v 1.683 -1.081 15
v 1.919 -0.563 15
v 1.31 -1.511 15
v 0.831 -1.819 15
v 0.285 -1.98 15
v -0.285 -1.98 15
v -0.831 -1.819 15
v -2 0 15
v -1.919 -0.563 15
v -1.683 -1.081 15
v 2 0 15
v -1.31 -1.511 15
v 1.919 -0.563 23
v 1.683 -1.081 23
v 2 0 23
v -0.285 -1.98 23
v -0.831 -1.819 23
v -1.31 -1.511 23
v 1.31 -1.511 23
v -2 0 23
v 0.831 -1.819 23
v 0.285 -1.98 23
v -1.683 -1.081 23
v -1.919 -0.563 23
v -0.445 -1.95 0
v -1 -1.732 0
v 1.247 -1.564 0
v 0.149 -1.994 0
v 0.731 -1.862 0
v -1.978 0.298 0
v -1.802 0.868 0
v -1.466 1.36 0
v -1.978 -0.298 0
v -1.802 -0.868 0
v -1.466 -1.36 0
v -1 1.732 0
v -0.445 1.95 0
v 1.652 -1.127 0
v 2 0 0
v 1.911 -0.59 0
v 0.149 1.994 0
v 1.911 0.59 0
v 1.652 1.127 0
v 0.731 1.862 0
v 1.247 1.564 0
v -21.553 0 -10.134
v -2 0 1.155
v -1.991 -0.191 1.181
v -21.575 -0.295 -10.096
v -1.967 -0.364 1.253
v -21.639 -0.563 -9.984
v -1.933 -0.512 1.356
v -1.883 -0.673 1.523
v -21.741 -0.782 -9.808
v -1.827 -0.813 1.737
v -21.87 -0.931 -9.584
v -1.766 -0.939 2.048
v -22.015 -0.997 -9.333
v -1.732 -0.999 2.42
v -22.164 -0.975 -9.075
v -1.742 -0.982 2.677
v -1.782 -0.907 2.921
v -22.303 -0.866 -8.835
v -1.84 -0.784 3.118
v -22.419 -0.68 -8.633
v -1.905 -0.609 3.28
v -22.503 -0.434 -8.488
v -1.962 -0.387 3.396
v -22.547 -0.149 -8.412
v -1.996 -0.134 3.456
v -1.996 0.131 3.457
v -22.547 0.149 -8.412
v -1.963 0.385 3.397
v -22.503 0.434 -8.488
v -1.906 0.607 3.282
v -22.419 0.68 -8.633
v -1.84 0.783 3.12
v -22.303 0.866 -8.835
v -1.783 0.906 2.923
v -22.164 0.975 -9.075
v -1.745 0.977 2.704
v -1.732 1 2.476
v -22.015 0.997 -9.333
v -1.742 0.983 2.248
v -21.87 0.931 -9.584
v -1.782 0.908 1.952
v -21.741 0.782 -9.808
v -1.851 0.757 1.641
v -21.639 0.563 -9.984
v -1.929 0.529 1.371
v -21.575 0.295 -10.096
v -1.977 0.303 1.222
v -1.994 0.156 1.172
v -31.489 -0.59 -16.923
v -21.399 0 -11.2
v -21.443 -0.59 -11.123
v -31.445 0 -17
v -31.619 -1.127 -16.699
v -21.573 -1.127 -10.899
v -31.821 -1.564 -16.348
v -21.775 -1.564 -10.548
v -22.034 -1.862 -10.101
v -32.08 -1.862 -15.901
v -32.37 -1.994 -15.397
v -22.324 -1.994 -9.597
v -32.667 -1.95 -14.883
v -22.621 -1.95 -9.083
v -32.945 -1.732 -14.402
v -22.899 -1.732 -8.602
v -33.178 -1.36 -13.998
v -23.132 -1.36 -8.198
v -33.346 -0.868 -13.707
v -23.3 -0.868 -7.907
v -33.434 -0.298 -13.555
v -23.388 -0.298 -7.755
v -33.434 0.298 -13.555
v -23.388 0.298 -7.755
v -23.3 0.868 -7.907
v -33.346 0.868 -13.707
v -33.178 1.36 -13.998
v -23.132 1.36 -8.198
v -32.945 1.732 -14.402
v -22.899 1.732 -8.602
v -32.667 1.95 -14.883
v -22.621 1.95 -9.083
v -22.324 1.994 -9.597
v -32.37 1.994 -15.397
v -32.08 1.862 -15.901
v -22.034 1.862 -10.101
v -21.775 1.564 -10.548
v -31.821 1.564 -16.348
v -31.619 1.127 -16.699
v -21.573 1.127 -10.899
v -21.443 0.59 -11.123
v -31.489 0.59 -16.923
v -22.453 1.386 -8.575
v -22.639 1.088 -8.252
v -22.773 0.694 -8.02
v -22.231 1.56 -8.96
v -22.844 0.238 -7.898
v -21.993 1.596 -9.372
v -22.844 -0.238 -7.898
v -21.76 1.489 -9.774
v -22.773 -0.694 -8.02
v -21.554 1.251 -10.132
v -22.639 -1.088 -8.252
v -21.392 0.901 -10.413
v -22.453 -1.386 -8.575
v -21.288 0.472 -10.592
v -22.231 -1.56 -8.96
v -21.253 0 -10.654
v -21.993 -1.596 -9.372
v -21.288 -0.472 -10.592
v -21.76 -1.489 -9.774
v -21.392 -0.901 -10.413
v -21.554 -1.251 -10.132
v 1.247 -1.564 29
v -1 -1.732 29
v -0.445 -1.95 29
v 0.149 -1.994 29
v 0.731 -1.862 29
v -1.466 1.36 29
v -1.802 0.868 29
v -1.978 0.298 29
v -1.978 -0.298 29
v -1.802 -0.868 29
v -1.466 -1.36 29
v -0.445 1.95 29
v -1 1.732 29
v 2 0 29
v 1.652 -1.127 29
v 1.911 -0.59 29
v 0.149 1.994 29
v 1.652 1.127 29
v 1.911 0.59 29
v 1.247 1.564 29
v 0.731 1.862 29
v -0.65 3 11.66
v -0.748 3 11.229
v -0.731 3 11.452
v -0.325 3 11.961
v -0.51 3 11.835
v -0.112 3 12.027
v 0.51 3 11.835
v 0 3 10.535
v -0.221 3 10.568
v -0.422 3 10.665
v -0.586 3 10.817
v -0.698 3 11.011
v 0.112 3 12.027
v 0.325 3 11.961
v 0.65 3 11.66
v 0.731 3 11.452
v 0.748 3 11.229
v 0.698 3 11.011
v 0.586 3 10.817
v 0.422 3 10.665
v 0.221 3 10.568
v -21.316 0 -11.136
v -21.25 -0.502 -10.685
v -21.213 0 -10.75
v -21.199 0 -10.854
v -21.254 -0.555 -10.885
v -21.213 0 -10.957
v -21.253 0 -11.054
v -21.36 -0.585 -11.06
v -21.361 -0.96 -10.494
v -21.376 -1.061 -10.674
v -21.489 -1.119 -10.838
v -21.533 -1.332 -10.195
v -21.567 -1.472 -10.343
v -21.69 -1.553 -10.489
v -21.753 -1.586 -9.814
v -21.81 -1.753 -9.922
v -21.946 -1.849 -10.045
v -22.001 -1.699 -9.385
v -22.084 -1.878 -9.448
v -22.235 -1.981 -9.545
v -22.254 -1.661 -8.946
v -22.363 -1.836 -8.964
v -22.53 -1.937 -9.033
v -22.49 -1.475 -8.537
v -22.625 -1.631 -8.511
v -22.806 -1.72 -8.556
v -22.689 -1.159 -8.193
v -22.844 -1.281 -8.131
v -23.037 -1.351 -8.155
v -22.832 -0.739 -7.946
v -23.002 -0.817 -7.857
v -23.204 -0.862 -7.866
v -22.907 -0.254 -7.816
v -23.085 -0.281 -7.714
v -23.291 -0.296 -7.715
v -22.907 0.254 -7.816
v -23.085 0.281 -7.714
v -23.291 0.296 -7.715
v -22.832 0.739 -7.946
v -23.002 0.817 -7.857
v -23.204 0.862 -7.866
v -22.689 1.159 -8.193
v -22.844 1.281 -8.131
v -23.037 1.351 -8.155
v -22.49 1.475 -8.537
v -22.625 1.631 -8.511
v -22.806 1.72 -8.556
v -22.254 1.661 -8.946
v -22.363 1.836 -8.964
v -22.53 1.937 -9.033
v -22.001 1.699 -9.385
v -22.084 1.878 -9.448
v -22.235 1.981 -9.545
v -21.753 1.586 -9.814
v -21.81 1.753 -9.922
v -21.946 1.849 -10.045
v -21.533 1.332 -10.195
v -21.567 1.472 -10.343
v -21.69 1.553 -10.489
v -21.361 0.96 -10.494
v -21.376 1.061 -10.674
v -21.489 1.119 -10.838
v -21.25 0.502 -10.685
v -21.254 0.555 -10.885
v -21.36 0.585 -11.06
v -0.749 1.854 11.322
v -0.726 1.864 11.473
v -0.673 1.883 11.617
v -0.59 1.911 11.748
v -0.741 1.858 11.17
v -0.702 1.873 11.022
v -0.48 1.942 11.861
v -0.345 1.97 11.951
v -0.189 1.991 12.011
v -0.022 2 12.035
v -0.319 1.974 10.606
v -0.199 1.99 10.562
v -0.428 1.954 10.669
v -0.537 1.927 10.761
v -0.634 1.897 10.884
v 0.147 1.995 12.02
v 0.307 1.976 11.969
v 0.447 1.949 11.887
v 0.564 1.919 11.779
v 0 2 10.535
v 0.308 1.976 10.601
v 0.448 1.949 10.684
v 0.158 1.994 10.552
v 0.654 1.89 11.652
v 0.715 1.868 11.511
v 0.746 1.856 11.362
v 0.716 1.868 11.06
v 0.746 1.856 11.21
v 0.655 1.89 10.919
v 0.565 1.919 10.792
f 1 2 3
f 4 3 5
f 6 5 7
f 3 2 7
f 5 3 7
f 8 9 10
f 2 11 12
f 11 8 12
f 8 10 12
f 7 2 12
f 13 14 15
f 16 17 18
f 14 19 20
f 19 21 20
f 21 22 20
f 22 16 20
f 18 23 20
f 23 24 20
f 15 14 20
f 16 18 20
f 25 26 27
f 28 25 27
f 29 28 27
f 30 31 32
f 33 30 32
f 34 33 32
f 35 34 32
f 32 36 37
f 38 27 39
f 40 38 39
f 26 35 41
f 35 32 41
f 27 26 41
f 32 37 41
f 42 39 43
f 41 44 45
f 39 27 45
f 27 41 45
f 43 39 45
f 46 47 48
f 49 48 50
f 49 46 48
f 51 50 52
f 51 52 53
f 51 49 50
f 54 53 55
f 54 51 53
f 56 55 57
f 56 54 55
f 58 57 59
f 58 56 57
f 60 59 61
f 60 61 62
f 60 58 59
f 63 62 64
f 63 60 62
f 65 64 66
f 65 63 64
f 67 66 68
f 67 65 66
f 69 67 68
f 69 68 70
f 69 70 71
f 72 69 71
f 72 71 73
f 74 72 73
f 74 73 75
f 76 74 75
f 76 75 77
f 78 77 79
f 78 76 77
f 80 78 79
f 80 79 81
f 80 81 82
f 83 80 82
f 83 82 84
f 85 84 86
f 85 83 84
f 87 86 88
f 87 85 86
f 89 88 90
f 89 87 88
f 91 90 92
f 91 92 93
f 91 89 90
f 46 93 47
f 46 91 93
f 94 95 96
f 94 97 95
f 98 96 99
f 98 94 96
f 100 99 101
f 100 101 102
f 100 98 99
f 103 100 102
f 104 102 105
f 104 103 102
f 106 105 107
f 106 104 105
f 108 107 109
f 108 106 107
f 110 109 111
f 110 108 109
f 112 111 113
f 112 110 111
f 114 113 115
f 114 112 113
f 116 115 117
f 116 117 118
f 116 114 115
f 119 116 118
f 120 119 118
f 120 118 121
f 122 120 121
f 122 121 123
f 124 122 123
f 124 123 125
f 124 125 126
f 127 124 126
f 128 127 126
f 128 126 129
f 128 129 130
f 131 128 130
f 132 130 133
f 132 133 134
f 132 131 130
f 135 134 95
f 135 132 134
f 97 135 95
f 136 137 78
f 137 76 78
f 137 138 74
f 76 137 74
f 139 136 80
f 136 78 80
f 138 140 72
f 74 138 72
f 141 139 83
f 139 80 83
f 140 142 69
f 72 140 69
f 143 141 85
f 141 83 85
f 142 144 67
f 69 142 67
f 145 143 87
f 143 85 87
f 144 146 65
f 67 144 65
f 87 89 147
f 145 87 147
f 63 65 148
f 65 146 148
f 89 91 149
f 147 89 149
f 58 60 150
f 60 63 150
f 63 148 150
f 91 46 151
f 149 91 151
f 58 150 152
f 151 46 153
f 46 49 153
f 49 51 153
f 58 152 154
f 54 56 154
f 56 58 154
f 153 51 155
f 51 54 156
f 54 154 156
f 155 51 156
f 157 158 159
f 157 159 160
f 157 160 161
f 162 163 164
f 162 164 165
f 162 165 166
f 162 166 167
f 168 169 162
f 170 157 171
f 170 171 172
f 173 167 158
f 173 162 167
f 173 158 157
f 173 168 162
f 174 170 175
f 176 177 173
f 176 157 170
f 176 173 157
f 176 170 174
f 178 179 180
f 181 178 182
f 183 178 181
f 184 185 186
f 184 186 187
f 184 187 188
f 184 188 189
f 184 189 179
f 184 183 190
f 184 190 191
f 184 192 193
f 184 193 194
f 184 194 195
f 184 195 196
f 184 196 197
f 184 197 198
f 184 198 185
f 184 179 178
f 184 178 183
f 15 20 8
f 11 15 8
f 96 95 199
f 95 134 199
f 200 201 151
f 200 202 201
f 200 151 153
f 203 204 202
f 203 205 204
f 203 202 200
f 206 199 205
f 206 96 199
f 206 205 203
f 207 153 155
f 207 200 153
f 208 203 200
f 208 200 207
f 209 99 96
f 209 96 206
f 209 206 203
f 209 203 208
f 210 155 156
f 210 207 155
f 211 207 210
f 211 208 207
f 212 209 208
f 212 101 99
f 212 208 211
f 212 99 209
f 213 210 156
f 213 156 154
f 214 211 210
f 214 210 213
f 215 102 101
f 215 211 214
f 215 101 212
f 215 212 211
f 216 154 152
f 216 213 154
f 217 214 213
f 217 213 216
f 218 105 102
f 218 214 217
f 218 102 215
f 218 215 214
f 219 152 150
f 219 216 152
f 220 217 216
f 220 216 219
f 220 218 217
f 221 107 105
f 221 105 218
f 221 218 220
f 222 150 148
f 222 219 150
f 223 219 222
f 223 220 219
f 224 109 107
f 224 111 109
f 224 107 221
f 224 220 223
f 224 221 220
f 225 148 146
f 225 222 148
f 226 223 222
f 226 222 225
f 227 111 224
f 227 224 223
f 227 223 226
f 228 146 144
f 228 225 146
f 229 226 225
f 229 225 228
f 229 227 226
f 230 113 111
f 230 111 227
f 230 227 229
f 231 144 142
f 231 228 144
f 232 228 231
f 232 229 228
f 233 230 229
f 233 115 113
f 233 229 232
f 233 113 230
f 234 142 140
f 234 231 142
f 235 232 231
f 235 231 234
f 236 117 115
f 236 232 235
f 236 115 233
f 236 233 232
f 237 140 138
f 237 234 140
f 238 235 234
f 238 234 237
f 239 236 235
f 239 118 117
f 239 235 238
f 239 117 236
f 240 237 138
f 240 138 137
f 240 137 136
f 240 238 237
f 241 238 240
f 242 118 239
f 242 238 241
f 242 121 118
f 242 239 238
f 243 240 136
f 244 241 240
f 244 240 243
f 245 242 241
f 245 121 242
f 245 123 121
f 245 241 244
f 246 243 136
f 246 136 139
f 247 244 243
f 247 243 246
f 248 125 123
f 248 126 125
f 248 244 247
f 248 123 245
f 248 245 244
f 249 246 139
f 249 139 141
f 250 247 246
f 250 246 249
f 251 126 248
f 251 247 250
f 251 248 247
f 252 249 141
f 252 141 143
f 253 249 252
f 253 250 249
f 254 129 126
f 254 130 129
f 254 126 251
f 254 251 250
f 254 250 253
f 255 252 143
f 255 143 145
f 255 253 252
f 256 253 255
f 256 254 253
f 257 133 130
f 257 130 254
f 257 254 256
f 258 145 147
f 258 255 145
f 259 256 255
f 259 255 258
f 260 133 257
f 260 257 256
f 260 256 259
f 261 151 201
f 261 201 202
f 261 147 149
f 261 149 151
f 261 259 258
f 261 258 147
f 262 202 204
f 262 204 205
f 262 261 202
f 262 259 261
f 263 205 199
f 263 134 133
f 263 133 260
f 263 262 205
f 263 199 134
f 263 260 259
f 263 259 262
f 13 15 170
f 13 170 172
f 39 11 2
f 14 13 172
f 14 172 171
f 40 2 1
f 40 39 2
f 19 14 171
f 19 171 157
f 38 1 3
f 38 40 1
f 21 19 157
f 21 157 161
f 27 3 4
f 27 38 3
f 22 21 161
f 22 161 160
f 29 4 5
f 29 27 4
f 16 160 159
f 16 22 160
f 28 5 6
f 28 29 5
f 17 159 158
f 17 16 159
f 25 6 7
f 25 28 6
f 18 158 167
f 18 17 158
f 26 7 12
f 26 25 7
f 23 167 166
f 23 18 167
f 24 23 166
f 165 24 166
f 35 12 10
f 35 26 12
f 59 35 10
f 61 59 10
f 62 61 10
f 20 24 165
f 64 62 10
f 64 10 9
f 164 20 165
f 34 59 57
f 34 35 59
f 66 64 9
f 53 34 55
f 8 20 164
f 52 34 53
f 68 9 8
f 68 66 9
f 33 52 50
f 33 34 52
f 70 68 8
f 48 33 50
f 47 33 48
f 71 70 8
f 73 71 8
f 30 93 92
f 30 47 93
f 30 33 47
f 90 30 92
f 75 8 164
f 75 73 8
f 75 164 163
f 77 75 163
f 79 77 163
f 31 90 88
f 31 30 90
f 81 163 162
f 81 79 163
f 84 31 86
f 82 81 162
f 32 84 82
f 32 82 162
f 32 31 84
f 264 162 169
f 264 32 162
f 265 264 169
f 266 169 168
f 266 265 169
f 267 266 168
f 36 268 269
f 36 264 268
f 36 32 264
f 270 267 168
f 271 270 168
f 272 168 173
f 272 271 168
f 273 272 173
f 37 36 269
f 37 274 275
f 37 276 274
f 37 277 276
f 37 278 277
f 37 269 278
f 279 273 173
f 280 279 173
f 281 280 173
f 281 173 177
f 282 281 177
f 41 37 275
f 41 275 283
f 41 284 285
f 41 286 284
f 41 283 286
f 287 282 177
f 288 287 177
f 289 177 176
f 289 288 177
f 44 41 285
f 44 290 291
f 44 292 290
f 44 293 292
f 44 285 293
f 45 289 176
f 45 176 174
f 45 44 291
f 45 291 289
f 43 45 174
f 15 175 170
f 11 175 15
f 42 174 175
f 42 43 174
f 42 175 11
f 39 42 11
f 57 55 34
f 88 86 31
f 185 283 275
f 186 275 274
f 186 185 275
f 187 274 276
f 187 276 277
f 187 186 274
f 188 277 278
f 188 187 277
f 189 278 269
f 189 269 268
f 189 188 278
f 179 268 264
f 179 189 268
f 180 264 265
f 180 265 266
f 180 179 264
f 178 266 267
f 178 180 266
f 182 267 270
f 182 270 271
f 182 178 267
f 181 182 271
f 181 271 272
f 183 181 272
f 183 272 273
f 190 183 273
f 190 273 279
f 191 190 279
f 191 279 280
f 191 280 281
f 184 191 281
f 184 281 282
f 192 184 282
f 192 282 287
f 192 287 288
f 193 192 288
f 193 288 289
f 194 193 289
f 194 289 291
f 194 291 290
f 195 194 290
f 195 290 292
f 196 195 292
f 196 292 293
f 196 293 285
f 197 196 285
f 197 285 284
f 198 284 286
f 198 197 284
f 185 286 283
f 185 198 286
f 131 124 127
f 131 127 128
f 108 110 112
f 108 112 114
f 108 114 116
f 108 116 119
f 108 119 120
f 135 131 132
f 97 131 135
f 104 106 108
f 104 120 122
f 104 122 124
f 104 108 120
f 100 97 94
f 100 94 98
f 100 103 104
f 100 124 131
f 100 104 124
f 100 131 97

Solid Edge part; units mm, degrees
sketch "Sketch1" plane through (0, 0, 0) normal (0, 0, 1) x (1, 0, 0)
  circle A0 centre (0, 0) radius 2
  dimension "D1" = 4
extrude "Protrusion1" add sketch "Sketch1" along normal blind 29
sketch "Sketch2" plane through (-38.4939, 0, -4.7907) normal (-0.866, 0, -0.5) x (0.5, 0, -0.866)
  circle A0 centre (12.0981, 0) radius 1
  dimension "D1" = 2
  dimension "D2" = 2
extrude "Protrusion2" add sketch "Sketch2" against normal up to next
sketch "Sketch3" plane through (-38.4939, 0, -4.7907) normal (-0.866, 0, -0.5) x (0.5, 0, -0.866)
  circle A0 centre (12.0981, 0) radius 2
  dimension "D1" = 4
extrude "Top___Lever" add sketch "Sketch3" against normal blind 12
fillet "Round___Lever" radius 0.4 1 edges at (-23.0526, 0, -7.5359)
sketch "Sketch4" plane through (-2, 0, 14.5) normal (-1, 0, 0) x (0, 0, -1)
  line L0 (-0.5, 2) -> (-8.5, 2)
  line L1 (-8.5, 2) -> (-8.5, 0)
  line L2 (-8.5, 0) -> (-0.5, 0)
  line L3 (-0.5, 0) -> (-0.5, 2)
  dimension "D1" = 6
  dimension "D2" = 8
extrude "Cutout1" cut sketch "Sketch4" against normal up to next
sketch "Sketch5" plane through (0, 3, 14.5) normal (0, 1, 0) x (0, 0, -1)
  circle A0 centre (3.215, 0) radius 0.75
  dimension "D1" = 1.5
  dimension "D2" = 17.715
extrude "Protrusion3" add sketch "Sketch5" against normal up to next
properties material "ABS Plastic, high impact"
